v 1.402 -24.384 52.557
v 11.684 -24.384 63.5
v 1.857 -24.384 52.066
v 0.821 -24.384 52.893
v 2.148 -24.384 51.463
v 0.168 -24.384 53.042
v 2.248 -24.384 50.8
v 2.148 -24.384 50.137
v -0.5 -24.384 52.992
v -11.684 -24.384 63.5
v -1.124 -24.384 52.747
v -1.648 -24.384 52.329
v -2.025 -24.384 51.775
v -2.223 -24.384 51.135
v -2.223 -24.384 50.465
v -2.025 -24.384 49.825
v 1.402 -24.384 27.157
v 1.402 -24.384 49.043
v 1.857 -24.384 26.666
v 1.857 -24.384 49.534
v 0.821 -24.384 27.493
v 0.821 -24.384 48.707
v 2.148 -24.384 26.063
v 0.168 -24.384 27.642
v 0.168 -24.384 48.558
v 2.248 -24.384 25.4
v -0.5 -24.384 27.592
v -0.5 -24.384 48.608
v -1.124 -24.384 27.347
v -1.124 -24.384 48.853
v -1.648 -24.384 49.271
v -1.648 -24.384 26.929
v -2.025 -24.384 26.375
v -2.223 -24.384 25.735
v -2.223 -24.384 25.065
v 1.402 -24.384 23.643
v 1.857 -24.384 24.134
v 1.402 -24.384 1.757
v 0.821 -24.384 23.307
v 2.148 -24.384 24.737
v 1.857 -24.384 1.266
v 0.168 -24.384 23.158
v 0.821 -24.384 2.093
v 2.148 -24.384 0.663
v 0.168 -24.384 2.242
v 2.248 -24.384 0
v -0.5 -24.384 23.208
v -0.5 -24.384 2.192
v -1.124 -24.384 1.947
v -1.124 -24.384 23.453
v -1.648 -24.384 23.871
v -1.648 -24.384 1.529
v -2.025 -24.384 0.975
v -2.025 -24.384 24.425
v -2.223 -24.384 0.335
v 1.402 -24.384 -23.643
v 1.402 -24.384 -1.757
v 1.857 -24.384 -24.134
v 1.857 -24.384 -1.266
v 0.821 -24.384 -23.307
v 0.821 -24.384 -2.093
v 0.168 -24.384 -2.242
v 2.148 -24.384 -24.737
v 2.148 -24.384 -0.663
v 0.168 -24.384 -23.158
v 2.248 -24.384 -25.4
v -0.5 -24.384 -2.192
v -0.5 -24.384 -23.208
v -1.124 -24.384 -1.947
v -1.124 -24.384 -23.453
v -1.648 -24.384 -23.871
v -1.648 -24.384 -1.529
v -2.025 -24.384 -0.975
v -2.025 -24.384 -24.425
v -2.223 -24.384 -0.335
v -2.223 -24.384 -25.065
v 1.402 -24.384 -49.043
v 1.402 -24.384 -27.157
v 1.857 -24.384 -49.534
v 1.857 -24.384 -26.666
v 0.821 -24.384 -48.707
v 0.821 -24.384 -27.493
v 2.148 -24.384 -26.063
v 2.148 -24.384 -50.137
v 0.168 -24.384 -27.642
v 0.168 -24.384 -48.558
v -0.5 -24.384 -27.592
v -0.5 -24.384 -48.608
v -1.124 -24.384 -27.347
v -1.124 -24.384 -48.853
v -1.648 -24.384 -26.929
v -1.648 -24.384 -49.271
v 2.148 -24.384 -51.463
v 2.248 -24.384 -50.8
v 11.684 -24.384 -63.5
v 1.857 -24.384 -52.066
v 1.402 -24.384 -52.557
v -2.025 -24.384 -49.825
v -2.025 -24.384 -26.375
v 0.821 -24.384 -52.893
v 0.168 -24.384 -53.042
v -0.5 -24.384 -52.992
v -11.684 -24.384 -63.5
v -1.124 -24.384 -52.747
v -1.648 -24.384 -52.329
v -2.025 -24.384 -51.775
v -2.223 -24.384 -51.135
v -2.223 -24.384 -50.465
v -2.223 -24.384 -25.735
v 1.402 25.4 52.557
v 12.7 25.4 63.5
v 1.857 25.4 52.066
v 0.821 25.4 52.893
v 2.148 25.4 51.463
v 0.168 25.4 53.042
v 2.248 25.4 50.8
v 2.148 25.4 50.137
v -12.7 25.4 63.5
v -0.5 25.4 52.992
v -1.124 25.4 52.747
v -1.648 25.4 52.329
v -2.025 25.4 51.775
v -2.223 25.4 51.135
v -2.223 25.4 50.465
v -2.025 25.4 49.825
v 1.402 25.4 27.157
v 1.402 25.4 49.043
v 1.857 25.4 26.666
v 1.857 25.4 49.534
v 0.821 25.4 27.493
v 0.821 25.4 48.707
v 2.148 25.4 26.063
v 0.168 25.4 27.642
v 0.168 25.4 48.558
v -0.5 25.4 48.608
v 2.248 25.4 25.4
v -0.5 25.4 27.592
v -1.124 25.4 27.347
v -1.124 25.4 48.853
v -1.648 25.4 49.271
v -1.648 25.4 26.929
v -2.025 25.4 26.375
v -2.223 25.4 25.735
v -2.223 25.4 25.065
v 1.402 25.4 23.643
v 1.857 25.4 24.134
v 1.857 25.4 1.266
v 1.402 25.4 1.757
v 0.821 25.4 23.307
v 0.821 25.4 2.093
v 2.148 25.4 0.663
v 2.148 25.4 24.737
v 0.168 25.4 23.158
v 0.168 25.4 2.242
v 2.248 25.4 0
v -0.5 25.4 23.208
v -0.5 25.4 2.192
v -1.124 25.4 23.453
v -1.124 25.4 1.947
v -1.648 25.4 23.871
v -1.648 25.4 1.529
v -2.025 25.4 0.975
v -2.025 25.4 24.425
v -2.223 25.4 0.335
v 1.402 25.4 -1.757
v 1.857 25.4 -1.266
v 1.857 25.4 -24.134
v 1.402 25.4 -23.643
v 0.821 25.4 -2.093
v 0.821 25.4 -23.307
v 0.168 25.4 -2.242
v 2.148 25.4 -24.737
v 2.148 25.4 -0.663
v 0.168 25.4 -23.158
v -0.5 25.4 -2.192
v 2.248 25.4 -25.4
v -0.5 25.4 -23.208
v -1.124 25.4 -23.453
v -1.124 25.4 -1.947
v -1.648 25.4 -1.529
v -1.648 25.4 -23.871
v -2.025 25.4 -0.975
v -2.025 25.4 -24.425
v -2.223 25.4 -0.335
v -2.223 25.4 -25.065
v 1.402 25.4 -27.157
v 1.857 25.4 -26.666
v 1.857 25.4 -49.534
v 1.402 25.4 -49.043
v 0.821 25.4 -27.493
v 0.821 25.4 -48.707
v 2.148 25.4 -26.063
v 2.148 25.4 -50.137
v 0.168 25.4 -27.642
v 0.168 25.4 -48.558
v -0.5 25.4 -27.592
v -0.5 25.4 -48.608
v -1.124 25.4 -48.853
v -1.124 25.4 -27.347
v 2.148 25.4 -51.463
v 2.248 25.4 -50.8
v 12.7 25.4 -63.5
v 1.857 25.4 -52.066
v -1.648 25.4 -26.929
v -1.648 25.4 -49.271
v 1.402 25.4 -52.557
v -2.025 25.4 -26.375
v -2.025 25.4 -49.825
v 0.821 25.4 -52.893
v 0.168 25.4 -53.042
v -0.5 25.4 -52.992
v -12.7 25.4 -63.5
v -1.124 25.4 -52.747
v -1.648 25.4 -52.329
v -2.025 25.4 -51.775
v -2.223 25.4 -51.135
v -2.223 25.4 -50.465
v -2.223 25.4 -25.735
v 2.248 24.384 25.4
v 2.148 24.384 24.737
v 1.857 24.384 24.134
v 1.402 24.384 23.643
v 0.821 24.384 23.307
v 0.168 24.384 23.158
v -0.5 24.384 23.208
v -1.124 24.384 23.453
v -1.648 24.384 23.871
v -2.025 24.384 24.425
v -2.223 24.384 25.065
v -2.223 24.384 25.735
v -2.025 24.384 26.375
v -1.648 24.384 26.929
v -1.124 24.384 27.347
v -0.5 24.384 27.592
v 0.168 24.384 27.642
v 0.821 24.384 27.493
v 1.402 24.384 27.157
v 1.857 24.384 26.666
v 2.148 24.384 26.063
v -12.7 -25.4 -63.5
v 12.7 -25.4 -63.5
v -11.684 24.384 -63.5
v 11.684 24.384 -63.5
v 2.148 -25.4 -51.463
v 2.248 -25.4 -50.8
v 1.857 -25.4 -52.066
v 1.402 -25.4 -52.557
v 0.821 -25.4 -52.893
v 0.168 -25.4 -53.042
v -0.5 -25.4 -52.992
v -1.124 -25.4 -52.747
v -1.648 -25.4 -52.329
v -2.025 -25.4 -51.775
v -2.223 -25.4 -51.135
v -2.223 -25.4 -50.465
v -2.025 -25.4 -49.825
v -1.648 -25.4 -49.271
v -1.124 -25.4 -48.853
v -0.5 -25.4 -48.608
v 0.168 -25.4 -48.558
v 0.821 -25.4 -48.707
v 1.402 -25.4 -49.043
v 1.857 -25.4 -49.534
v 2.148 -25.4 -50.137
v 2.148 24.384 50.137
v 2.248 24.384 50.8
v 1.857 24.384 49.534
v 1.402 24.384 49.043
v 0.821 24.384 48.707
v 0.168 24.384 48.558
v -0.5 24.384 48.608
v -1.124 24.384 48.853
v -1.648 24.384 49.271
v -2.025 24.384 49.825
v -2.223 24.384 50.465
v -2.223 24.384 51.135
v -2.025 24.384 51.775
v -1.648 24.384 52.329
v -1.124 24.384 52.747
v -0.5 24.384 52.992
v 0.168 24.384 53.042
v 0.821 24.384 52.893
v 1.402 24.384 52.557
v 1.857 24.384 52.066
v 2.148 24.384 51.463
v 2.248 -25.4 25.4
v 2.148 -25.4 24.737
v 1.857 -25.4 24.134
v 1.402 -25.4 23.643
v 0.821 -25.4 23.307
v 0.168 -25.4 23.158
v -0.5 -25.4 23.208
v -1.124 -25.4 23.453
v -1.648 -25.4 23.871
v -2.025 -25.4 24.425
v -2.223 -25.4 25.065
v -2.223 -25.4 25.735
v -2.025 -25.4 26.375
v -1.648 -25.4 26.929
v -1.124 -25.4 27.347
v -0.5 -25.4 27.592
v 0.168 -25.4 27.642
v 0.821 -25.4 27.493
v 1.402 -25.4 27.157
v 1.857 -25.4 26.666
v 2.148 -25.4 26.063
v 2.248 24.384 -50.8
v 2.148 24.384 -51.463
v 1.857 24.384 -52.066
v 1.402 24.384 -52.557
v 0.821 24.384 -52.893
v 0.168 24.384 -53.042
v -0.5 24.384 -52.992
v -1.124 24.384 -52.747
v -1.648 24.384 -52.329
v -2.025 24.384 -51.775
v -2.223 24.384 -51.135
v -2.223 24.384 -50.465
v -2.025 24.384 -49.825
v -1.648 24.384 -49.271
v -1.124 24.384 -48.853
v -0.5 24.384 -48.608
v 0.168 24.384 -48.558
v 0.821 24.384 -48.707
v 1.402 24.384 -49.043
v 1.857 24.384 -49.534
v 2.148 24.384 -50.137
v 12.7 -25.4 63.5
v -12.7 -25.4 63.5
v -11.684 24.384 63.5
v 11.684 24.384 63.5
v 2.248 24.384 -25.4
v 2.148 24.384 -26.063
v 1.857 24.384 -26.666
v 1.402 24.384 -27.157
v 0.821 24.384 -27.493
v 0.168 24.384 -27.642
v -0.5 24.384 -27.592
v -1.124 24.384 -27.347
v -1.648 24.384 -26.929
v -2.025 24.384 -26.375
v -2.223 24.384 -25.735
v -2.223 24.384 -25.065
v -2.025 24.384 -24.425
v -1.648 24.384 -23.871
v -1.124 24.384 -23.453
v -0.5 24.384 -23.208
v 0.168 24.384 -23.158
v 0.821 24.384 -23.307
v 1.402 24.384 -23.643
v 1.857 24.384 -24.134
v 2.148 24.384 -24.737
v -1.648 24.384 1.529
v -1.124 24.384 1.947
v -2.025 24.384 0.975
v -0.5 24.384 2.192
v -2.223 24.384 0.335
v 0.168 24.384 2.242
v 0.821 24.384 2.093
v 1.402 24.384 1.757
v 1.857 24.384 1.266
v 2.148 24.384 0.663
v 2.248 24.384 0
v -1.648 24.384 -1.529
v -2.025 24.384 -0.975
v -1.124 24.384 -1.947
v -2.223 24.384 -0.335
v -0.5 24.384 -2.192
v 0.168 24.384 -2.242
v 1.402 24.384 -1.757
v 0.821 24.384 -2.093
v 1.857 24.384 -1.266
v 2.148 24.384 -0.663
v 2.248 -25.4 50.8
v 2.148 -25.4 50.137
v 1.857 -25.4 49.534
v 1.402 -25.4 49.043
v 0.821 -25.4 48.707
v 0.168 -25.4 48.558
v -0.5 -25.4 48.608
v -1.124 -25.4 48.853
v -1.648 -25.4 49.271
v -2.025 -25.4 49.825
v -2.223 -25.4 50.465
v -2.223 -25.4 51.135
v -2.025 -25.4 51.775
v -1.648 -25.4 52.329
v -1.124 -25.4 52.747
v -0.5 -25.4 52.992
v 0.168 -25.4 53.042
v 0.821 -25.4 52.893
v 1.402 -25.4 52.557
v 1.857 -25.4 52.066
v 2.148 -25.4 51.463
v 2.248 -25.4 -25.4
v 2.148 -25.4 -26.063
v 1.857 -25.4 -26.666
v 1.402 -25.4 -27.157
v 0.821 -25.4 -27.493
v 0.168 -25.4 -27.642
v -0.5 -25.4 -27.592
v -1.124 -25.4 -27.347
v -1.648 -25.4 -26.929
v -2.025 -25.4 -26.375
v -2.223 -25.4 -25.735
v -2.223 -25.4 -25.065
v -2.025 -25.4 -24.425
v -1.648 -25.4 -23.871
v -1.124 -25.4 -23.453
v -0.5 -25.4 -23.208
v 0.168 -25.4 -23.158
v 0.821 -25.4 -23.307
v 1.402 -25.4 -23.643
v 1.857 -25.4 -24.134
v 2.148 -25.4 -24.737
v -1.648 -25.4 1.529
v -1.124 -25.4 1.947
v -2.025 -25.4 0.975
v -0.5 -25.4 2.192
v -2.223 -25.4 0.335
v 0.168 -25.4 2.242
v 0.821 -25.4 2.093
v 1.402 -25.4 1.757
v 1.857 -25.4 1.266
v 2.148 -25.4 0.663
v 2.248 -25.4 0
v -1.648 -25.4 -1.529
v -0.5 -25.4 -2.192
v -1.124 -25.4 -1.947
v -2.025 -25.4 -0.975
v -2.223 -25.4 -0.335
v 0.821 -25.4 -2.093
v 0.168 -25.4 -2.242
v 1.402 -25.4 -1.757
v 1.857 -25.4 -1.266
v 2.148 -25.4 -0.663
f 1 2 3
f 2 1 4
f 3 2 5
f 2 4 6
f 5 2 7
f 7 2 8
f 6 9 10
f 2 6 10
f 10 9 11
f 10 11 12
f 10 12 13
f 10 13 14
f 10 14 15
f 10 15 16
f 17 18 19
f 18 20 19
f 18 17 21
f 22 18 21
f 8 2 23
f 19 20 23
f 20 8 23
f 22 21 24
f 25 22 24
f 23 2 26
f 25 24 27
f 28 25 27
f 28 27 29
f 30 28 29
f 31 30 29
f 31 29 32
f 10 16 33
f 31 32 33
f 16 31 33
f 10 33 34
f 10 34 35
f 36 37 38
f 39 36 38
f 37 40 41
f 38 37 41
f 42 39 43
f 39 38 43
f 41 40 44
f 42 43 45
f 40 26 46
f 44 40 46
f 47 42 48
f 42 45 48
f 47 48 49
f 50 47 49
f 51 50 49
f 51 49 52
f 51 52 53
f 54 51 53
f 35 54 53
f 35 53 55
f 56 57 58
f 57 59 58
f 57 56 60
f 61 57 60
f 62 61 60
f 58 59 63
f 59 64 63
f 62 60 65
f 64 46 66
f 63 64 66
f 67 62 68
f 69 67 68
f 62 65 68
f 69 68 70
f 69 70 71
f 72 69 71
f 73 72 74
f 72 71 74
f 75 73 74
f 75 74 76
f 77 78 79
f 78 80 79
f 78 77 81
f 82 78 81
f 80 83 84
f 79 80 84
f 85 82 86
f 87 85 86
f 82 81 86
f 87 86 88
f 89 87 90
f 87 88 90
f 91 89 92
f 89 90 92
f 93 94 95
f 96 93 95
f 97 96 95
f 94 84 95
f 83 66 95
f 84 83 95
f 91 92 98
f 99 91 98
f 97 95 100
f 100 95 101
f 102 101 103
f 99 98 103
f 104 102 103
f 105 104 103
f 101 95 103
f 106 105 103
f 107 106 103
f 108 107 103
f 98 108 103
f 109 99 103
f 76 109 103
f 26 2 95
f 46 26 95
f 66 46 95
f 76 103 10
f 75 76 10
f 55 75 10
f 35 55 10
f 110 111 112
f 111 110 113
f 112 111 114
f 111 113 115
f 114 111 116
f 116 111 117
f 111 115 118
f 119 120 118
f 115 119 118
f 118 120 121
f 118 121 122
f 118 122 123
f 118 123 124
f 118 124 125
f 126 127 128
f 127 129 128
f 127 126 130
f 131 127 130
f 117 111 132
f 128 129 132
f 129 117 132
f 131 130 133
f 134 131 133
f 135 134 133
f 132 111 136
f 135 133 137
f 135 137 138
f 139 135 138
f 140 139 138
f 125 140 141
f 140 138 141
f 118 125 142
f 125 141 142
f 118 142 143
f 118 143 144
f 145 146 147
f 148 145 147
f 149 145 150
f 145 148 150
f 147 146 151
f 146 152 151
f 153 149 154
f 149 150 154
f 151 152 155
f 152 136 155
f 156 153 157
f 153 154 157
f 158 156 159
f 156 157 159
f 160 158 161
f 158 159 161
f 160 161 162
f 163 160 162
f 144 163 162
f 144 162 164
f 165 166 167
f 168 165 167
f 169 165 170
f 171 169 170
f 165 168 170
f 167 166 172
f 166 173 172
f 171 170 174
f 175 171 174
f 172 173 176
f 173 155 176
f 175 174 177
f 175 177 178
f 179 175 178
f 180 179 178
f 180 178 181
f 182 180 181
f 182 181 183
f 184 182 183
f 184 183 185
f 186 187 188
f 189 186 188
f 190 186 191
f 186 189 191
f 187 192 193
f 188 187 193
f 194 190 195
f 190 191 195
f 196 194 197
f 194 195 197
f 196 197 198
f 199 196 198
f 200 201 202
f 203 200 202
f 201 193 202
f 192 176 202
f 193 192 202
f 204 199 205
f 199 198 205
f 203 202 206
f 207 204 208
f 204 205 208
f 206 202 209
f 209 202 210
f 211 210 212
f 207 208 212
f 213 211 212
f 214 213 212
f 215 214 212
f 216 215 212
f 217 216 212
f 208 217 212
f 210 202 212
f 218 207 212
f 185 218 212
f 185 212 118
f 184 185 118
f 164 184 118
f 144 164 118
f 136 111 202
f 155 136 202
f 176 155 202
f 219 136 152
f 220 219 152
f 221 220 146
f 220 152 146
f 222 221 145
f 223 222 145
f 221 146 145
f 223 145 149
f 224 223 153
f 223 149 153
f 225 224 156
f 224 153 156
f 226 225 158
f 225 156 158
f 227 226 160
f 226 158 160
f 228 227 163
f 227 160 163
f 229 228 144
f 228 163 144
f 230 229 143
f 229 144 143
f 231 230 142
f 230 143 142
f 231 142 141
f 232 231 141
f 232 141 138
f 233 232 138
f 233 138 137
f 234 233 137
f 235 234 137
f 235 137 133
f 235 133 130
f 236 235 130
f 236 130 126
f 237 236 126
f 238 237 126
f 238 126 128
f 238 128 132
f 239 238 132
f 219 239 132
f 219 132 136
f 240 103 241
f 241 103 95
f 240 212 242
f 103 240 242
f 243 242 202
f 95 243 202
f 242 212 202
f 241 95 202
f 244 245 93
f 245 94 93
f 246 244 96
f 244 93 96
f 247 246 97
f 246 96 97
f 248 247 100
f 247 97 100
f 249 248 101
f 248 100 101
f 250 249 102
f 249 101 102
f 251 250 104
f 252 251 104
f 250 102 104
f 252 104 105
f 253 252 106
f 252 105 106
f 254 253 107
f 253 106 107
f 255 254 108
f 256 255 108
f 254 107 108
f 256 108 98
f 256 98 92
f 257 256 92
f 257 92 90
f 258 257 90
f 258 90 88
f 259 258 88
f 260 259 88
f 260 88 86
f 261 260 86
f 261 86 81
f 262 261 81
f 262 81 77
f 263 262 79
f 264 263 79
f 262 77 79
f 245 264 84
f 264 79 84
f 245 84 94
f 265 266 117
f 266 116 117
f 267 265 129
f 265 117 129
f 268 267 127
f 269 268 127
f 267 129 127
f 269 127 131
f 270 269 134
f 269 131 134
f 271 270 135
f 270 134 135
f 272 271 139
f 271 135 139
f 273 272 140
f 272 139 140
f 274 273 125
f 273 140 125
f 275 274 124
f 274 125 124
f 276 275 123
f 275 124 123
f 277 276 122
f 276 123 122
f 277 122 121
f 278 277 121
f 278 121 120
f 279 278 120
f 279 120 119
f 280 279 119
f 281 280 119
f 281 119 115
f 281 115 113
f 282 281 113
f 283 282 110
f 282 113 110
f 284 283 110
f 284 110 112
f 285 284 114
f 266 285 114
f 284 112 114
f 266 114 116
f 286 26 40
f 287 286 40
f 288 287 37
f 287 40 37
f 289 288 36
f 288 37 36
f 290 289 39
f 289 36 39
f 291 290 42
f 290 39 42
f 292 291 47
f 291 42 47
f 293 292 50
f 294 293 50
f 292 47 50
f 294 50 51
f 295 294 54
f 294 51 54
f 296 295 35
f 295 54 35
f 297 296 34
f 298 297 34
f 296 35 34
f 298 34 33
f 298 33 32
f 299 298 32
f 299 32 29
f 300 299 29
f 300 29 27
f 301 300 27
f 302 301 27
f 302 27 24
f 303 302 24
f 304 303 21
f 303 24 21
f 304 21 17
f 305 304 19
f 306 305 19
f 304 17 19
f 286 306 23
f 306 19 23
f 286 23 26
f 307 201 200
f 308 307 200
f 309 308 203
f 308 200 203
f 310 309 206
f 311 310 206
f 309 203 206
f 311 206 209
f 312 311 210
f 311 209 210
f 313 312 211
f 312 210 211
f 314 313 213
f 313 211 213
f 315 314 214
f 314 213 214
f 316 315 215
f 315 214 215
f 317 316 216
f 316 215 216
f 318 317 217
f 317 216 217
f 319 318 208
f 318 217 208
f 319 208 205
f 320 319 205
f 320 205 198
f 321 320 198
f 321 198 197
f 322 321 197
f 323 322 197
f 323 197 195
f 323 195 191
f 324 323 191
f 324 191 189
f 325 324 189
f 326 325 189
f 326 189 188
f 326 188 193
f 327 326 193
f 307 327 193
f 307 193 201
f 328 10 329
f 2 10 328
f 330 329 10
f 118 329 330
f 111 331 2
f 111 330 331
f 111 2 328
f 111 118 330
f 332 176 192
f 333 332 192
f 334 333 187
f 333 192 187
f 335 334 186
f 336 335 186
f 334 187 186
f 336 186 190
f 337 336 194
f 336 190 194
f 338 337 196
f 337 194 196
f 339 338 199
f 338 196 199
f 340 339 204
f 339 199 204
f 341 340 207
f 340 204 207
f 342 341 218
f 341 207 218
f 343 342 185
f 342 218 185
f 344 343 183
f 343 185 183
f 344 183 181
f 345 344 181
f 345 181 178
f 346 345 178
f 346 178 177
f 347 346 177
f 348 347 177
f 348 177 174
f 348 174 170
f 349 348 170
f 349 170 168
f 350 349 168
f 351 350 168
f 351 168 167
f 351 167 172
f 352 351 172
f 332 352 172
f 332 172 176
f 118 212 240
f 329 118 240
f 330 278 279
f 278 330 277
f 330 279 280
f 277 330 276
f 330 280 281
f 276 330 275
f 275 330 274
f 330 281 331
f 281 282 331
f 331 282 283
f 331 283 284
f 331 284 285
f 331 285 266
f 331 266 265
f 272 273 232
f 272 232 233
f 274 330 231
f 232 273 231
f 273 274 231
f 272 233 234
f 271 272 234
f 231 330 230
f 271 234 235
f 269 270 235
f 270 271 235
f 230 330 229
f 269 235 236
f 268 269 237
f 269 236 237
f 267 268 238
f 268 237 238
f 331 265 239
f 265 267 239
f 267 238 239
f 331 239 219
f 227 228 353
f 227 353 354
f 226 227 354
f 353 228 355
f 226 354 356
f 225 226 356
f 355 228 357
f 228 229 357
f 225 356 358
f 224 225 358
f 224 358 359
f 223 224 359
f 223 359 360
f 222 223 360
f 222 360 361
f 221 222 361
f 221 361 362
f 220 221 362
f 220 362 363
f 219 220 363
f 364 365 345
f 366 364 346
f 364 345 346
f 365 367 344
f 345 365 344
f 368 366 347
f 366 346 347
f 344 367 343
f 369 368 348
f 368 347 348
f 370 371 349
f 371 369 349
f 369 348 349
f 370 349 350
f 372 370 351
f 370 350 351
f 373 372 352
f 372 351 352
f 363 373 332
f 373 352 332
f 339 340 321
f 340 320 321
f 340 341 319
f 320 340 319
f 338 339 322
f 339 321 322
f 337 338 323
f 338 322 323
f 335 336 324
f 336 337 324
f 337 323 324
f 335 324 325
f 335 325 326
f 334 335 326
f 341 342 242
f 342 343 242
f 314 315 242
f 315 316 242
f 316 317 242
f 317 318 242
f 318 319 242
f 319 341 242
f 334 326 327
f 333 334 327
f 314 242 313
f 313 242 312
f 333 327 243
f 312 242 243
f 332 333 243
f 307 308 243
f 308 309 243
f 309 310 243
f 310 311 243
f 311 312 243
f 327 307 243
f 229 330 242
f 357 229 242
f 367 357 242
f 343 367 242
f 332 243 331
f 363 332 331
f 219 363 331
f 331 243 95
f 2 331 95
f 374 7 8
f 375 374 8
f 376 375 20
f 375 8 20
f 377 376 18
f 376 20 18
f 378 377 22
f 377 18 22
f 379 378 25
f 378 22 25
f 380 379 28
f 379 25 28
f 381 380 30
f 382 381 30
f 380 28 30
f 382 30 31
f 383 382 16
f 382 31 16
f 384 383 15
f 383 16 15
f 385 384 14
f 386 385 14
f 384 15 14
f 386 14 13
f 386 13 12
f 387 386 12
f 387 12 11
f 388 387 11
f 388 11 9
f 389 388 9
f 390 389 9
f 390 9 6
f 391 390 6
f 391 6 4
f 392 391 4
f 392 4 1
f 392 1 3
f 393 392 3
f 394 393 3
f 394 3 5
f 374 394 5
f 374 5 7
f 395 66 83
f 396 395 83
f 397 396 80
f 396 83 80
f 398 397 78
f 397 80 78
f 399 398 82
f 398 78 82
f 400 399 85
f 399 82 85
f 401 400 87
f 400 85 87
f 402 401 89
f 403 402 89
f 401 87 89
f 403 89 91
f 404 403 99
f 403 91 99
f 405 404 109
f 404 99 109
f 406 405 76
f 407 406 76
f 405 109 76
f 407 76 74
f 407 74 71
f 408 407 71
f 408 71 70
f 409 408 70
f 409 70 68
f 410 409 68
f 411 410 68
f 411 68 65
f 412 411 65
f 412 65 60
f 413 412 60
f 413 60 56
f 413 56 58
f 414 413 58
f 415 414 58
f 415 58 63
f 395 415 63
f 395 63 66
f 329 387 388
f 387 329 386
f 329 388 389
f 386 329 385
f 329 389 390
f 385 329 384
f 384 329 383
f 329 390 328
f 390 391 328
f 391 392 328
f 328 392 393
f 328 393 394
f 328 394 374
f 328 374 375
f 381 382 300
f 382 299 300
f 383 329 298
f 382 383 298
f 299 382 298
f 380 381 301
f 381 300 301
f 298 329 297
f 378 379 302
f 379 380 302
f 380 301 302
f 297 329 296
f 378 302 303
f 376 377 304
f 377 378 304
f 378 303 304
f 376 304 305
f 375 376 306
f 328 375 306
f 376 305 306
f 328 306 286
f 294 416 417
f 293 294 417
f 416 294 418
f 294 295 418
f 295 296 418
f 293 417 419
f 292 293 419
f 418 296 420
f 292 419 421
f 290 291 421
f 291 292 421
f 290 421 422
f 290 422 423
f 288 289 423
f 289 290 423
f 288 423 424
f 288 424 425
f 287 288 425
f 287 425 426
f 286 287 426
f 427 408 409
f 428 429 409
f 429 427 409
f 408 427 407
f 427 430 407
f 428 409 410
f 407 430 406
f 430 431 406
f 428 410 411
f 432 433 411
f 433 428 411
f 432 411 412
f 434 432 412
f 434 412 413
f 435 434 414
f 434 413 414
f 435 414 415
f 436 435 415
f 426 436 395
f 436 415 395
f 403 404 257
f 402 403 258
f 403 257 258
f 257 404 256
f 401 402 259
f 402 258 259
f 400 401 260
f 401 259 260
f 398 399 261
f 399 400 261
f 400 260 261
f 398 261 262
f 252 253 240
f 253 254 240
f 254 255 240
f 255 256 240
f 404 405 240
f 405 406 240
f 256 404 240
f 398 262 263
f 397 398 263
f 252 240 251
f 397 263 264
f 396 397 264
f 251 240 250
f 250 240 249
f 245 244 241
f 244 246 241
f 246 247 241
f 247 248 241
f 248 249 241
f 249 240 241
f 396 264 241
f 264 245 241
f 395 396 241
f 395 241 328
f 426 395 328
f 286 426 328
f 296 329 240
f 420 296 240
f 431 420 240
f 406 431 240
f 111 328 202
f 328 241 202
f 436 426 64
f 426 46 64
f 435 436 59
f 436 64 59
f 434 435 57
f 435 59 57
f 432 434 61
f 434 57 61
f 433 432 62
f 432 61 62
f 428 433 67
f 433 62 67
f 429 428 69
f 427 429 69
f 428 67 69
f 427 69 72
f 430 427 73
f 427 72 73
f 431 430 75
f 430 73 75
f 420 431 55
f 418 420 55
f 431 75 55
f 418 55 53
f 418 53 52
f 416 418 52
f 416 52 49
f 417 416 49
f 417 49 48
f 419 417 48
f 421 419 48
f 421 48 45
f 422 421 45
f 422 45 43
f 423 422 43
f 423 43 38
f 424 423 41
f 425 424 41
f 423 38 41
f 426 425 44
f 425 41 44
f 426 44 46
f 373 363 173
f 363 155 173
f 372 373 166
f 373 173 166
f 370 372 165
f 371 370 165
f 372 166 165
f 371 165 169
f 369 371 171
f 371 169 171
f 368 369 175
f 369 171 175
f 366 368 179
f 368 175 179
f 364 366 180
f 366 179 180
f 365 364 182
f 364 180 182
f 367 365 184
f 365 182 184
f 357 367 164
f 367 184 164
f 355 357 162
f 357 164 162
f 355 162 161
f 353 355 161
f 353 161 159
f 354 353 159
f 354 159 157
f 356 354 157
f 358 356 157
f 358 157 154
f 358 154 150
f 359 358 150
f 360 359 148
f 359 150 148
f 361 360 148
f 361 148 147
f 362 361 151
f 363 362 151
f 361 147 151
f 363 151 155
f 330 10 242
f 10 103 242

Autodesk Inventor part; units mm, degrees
ref_plane "YZ Plane" through (0, 0, 0) normal (1, 0, 0) x (0, 1, 0)
ref_plane "XZ Plane" through (0, 0, 0) normal (0, 1, 0) x (-1, 0, 0)
ref_plane "XY Plane" through (0, 0, 0) normal (0, 0, 1) x (1, 0, 0)
sketch "Sketch1" plane through (0, 0, 0) normal (0, 0, 1) x (1, 0, 0)
  line L0 (12.7, 25.4) -> (-12.7, 25.4)
  line L1 (-12.7, 25.4) -> (-12.7, -25.4)
  line L2 (-12.7, -25.4) -> (12.7, -25.4)
  line L3 (12.7, -25.4) -> (12.7, 25.4)
  line L4 (12.7, 25.4) -> (-12.7, -25.4) construction
  line L5 (-12.7, 25.4) -> (12.7, -25.4) construction
  line L6 (-11.684, 24.384) -> (11.684, 24.384)
  line L7 (11.684, 24.384) -> (11.684, -24.384)
  line L8 (11.684, -24.384) -> (-11.684, -24.384)
  line L9 (-11.684, -24.384) -> (-11.684, 24.384)
  point P0 (0, 0)
  dimension "d0" = 1.016
  dimension "d1" = 50.8
  dimension "d2" = 25.4
extrude "Tube Length" add sketch "Sketch1" along normal mid plane 127
sketch "Sketch2" plane through (-12.7, 25.4, 63.5) normal (0, 1, 0) x (1, 0, 0)
  line L0 (0, 0) -> (0, 127) projected
  line L1 (25.4, 0) -> (0, 0) projected
  line L2 (25.4, 127) -> (25.4, 0) projected
  line L3 (0, 127) -> (25.4, 127) projected
  line L4 (25.4, 0) -> (0, 0) projected
  line L5 (12.7, 0) -> (12.7, 12.7) construction
  circle A0 centre (12.7, 12.7) radius 2.2479
  point P0 (12.7, 63.5)
  dimension "d5" = 12.7
  dimension "d6" = 4.4958
extrude "Top Hole" cut sketch "Sketch2" against normal through all contours A0
pattern_linear "Rectangular Pattern1" count 5 spacing 25.4 along (0, 0, -1) of "Top Hole"
sketch "Sketch3" plane through (0, 0, 63.5) normal (0, 0, 1) x (1, 0, 0)
  line L0 (0, 0) -> (0, 25.4) construction
  line L1 (12.7, 25.4) -> (-12.7, 25.4) projected
  line L2 (-0.0508, 25.4) -> (0, 25.2984)
  line L3 (0.0508, 25.4) -> (0, 25.2984)
  line L4 (-12.7, 12.6492) -> (-12.5984, 12.7)
  line L5 (-12.7, 12.7508) -> (-12.5984, 12.7)
  line L6 (-12.7, -0.0508) -> (-12.5984, 0)
  line L7 (-12.7, 0.0508) -> (-12.5984, 0)
  line L8 (-12.7, -12.7508) -> (-12.5984, -12.7)
  line L9 (-12.7, -12.6492) -> (-12.5984, -12.7)
  line L10 (12.7, 0.0508) -> (12.5984, 0)
  line L11 (12.7, 12.6492) -> (12.5984, 12.7)
  line L12 (12.7, 12.7508) -> (12.5984, 12.7)
  line L13 (12.7, -0.0508) -> (12.5984, 0)
  line L14 (12.7, -12.6492) -> (12.5984, -12.7)
  line L15 (12.7, -12.7508) -> (12.5984, -12.7)
  line L16 (0.0508, -25.4) -> (0, -25.2984)
  line L17 (-0.0508, -25.4) -> (0, -25.2984)
  line L18 (-12.7, 25.4) -> (-12.7, -25.4) projected
  line L19 (12.7, -25.4) -> (12.7, 25.4) projected
  line L20 (-12.7, -25.4) -> (12.7, -25.4) projected
  point P0 (0, 12.7)
  point P1 (-12.7, 12.7)
  point P2 (-12.7, 0)
  point P3 (-12.7, -12.7)
  point P4 (12.7, 12.7)
  point P5 (12.7, 0)
  point P6 (12.7, -12.7)
  point P7 (0, -25.4)
  dimension "d12" = 0.1016
  dimension "d13" = 0.1016
  dimension "d16" = 90
  dimension "d20" = 12.7
  dimension "d27" = 360
equation "\"d13\" = d12"
properties part number "Carrage Base & Top Tube" material "Aluminum 6061"
